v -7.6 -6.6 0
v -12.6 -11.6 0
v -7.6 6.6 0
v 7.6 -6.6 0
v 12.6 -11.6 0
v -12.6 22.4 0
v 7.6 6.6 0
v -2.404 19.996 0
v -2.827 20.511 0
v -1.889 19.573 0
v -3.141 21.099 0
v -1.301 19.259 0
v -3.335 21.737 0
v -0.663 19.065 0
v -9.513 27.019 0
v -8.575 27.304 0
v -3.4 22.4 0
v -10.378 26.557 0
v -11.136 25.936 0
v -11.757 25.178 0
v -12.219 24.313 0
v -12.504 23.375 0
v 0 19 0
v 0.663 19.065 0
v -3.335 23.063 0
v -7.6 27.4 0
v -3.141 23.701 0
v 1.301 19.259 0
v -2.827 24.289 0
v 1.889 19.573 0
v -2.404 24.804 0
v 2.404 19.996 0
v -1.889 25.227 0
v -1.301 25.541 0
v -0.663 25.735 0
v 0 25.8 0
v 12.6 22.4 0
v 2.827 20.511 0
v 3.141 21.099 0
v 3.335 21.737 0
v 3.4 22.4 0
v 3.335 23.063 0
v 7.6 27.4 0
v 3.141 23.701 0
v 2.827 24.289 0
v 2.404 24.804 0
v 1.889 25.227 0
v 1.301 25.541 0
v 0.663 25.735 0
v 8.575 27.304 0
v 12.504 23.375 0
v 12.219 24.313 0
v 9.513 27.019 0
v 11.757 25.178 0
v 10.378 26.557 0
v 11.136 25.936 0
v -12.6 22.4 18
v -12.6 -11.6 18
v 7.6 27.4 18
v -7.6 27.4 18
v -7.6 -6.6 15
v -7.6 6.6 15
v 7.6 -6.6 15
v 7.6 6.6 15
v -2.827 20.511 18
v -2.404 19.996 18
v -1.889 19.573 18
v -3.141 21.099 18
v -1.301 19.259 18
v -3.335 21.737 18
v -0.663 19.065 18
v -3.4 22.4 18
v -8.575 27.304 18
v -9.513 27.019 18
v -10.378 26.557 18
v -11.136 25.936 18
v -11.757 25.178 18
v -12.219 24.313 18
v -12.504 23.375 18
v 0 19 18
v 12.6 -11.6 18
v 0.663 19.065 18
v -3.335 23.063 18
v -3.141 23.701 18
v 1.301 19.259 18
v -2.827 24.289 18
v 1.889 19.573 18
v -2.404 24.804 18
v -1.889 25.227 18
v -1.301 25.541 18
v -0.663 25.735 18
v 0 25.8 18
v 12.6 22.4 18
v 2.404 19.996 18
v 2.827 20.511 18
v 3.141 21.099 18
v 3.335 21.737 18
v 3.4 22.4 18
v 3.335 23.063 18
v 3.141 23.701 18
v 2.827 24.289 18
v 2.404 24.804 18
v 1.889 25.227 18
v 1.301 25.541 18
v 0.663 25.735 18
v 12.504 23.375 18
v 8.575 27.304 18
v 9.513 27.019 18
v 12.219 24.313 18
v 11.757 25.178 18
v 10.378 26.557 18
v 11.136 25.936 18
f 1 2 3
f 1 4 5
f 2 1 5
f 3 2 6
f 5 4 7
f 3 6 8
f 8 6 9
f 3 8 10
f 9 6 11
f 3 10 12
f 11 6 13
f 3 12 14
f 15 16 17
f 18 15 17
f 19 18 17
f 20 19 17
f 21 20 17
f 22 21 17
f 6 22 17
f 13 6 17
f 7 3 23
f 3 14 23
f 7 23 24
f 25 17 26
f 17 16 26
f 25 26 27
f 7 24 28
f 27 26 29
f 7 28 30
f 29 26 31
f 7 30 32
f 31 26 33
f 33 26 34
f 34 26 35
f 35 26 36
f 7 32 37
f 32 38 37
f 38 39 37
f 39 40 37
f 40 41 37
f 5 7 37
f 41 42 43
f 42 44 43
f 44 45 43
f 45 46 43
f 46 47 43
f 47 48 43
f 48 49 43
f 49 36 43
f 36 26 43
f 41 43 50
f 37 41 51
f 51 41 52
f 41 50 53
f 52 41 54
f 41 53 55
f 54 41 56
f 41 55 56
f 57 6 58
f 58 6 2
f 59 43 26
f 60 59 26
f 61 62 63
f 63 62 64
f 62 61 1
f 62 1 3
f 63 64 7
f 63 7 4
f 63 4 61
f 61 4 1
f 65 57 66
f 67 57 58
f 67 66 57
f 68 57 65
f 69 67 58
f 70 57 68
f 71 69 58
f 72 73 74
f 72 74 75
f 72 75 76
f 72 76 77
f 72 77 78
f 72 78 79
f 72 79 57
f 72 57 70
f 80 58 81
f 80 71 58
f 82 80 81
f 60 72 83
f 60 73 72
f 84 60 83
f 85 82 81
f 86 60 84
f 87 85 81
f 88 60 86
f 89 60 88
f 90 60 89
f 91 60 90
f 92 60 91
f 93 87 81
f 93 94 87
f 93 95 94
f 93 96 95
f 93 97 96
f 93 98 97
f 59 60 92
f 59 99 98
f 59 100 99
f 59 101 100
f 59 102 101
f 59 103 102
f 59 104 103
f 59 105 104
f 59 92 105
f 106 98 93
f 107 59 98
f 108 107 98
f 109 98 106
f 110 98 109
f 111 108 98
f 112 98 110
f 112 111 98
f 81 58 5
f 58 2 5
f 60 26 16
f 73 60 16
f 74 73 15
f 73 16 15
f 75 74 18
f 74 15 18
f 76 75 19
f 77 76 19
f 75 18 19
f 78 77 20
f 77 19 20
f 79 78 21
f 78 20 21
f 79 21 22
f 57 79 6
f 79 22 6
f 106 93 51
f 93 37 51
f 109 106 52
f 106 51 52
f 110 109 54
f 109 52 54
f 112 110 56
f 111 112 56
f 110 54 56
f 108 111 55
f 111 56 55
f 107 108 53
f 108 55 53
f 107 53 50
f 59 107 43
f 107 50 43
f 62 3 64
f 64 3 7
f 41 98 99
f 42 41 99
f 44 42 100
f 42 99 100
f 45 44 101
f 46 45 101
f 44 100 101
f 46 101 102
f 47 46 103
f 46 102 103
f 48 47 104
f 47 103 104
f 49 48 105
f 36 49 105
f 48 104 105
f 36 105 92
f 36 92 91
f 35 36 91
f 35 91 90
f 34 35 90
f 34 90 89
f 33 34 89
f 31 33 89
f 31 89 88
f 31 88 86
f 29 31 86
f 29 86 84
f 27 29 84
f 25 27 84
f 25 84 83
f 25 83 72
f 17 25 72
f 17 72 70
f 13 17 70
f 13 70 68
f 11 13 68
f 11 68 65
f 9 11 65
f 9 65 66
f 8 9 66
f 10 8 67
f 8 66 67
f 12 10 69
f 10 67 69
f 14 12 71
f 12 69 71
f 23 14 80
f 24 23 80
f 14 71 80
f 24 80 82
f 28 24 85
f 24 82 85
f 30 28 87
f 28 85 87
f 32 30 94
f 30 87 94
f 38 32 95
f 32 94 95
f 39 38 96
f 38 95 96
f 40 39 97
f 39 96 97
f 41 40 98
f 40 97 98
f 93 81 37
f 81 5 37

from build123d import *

# Parameters (mm, degrees)
F1_DEPTH = 15
F3_DEPTH = 3
F4_R     = 3.4
F5_DEPTH = 18.001


with BuildPart() as f1:
    # F0 (on Top) → F1 (new body)
    with BuildSketch(Plane.XY):
        with BuildLine():
            Line((12.6, 0), (12.6, 22.4))
            ThreePointArc((12.6, 22.4), (11.135534, 25.935534), (7.6, 27.4))
            Line((7.6, 27.4), (0, 27.4))
            Line((0, 27.4), (-7.6, 27.4))
            ThreePointArc((-7.6, 27.4), (-11.135534, 25.935534), (-12.6, 22.4))
            Line((-12.6, 22.4), (-12.6, 0))
            Line((-12.6, 0), (-12.6, -11.6))
            Line((-12.6, -11.6), (0, -11.6))
            Line((0, -11.6), (12.6, -11.6))
            Line((12.6, -11.6), (12.6, 0))
        make_face()
        Polygon((-7.6, 6.6), (0, 6.6), (7.6, 6.6), (7.6, 0), (7.6, -6.6), (0, -6.6), (-7.6, -6.6), (-7.6, 0), align=None, mode=Mode.SUBTRACT)
    extrude(amount=F1_DEPTH)

    # F2 (on face) → F3 (join)
    with BuildSketch(Plane.XY.offset(15)):
        with BuildLine():
            Line((-12.6, 22.4), (-12.6, -11.6))
            Line((-12.6, -11.6), (0, -11.6))
            Line((0, -11.6), (12.6, -11.6))
            Line((12.6, -11.6), (12.6, 22.4))
            ThreePointArc((12.6, 22.4), (11.135534, 25.935534), (7.6, 27.4))
            Line((7.6, 27.4), (0, 27.4))
            Line((0, 27.4), (-7.6, 27.4))
            ThreePointArc((-7.6, 27.4), (-11.135534, 25.935534), (-12.6, 22.4))
        make_face()
    extrude(amount=F3_DEPTH)

    # F4 (on face) → F5 (cut, through all)
    with BuildSketch(Plane.XY.offset(18)):
        with Locations((0, 22.4)):
            Circle(F4_R)
    extrude(amount=-F5_DEPTH, mode=Mode.SUBTRACT)


solid = f1.part
